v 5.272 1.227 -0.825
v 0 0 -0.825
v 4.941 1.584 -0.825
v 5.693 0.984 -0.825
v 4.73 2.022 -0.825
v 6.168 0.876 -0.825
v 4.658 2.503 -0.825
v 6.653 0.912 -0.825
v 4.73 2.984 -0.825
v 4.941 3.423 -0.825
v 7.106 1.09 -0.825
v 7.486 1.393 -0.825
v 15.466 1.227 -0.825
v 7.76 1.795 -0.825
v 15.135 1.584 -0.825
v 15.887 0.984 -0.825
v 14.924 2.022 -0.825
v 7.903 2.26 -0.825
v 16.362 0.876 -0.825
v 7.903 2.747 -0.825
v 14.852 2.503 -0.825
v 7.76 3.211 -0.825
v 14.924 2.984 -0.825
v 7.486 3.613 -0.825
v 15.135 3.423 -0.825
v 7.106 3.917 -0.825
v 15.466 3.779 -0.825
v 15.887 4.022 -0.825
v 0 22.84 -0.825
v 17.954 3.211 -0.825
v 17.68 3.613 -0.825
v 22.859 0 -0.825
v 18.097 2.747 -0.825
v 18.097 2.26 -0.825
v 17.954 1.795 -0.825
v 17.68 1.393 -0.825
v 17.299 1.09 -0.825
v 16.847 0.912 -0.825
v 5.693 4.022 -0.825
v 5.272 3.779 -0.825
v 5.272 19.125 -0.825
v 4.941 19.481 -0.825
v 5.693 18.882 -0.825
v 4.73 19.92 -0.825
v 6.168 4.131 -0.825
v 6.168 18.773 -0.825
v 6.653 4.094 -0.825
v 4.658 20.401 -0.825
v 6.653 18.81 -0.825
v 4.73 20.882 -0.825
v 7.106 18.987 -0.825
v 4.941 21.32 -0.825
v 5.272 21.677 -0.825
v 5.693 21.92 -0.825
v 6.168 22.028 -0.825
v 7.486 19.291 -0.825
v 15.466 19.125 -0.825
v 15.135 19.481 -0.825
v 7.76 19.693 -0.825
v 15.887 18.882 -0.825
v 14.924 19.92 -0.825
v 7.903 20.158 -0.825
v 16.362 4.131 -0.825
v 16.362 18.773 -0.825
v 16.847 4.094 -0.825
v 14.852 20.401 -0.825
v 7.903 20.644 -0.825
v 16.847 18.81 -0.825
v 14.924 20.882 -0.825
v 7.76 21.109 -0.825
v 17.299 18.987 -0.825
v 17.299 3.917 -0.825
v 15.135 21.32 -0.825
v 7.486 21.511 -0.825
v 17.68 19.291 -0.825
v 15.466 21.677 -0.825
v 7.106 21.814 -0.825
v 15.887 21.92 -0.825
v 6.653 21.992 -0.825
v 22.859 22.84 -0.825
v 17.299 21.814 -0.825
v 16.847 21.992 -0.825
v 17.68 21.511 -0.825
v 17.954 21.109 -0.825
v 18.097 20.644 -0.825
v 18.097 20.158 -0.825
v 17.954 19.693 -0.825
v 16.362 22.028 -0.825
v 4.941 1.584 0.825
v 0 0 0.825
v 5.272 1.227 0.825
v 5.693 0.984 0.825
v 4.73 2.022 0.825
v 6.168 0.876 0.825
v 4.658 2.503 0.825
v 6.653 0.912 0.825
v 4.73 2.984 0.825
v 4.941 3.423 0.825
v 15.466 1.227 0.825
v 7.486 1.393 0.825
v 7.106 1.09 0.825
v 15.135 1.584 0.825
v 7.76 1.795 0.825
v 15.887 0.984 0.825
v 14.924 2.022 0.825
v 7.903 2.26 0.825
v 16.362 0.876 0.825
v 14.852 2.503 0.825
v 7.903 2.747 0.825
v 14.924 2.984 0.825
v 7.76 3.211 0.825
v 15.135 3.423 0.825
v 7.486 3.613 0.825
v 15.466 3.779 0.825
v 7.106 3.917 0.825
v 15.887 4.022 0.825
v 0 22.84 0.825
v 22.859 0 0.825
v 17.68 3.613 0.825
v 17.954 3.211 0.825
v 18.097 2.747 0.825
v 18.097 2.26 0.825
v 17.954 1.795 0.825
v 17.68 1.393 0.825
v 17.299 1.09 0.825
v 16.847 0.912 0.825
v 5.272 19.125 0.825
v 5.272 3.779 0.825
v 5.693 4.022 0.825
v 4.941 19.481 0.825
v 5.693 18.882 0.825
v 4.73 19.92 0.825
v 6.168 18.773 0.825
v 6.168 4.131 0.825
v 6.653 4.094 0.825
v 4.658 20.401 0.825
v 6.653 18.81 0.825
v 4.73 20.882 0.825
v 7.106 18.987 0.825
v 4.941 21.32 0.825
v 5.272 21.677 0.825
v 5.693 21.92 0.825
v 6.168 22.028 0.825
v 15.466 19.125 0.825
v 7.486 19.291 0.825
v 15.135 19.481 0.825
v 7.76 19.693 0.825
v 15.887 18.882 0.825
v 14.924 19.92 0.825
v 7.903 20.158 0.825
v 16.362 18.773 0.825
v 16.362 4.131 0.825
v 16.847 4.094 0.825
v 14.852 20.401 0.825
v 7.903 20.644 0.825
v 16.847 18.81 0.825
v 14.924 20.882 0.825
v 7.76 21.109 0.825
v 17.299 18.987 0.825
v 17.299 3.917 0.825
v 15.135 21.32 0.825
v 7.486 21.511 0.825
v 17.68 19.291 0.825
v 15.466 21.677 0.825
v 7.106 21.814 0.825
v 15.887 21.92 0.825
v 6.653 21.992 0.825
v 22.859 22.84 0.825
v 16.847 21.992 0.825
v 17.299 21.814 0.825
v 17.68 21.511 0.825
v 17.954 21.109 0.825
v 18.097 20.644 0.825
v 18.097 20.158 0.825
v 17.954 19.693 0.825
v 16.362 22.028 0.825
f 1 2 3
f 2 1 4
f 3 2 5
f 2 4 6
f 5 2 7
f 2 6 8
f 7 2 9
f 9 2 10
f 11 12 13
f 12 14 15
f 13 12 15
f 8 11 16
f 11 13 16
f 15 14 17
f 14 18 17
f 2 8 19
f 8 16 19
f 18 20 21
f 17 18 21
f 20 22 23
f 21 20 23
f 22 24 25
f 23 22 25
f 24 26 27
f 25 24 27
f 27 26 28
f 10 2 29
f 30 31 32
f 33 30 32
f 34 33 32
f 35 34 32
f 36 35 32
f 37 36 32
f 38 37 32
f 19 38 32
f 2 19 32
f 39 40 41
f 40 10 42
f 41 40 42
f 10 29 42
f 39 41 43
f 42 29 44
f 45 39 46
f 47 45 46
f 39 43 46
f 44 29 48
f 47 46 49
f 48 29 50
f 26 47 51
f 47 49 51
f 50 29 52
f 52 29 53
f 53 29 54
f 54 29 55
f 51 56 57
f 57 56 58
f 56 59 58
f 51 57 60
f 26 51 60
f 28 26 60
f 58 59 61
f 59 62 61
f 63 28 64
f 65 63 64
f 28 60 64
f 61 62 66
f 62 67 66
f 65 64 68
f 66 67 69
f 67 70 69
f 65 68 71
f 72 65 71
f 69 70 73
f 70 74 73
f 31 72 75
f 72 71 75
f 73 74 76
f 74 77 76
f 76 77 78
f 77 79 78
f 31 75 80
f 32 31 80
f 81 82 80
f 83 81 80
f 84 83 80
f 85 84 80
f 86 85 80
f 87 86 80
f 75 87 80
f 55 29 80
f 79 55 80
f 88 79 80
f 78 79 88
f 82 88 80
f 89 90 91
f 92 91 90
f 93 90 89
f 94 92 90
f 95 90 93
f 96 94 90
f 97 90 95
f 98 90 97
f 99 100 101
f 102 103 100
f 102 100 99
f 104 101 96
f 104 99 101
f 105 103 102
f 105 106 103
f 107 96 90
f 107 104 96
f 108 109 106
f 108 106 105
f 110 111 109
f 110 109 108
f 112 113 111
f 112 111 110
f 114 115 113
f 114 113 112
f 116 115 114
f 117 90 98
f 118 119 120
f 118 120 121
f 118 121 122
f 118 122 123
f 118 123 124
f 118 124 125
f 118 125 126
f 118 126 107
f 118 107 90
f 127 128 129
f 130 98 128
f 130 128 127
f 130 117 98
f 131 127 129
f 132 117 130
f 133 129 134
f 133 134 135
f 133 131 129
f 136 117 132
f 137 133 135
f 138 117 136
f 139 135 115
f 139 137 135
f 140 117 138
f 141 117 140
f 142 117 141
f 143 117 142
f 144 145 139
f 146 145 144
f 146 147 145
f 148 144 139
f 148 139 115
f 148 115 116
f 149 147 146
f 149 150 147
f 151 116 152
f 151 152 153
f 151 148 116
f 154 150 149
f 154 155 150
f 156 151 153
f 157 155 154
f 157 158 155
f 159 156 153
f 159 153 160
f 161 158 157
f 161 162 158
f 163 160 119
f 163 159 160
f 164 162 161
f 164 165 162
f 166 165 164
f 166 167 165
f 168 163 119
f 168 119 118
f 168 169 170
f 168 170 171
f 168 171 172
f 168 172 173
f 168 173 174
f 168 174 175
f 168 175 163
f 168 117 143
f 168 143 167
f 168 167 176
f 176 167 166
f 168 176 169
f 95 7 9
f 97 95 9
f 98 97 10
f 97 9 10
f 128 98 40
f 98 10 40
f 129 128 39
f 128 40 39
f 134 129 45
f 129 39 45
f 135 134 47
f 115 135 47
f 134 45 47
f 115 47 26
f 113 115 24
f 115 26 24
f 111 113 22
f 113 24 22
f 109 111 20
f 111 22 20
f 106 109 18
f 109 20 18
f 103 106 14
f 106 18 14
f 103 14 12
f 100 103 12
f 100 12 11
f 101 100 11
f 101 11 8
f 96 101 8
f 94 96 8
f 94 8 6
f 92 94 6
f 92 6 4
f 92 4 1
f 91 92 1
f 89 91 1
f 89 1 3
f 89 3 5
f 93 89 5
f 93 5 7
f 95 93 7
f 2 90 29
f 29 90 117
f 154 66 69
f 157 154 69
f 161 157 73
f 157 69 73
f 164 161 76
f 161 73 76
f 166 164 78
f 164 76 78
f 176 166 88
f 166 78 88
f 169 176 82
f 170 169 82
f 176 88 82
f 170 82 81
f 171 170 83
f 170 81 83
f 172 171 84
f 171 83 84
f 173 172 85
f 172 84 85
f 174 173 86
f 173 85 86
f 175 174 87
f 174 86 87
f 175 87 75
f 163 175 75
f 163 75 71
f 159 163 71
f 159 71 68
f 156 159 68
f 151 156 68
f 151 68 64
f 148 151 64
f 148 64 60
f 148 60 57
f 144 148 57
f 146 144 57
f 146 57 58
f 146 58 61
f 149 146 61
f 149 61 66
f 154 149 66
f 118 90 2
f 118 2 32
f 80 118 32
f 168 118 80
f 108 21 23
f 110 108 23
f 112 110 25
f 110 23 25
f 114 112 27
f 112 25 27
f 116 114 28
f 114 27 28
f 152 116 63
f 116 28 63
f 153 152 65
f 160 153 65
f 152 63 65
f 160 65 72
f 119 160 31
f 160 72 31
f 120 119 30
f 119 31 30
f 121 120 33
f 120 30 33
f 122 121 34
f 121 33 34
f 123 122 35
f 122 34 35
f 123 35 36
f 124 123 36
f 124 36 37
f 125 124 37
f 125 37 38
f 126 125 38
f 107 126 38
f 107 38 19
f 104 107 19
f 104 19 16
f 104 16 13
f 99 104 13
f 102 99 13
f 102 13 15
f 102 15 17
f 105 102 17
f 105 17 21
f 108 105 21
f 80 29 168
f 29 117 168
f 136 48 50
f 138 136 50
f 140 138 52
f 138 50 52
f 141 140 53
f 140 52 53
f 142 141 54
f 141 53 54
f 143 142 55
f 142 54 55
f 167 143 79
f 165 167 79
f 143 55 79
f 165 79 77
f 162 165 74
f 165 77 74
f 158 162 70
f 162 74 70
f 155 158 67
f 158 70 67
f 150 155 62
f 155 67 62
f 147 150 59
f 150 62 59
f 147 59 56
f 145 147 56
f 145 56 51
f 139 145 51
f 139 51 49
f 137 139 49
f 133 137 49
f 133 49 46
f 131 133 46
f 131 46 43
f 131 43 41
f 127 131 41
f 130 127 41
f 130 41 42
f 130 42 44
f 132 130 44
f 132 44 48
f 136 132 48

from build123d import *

# Parameters (mm, degrees)
SKETCH1_W             = 22.858863977
SKETCH1_H             = 22.839779742
BOSS_EXTRUDE1_DEPTH   = 0.825
F_4_CLEARANCE_HOLE1_D = 3.2639


with BuildPart() as part:
    # Sketch1 → Boss-Extrude1 (new, symmetric)
    with BuildSketch(Plane.XY):
        with Locations((11.429431989, 11.419889871)):
            Rectangle(SKETCH1_W, SKETCH1_H)
    extrude(amount=BOSS_EXTRUDE1_DEPTH, both=True)

    # #4 Clearance Hole1 (through all)
    with Locations(Plane.XY.offset(0.825)):
        with Locations((16.483506518, 20.400756331), (6.289658732, 20.400756331), (6.289658732, 2.503280726), (16.483506518, 2.503280726)):
            Hole(F_4_CLEARANCE_HOLE1_D / 2)


solid = part.part
